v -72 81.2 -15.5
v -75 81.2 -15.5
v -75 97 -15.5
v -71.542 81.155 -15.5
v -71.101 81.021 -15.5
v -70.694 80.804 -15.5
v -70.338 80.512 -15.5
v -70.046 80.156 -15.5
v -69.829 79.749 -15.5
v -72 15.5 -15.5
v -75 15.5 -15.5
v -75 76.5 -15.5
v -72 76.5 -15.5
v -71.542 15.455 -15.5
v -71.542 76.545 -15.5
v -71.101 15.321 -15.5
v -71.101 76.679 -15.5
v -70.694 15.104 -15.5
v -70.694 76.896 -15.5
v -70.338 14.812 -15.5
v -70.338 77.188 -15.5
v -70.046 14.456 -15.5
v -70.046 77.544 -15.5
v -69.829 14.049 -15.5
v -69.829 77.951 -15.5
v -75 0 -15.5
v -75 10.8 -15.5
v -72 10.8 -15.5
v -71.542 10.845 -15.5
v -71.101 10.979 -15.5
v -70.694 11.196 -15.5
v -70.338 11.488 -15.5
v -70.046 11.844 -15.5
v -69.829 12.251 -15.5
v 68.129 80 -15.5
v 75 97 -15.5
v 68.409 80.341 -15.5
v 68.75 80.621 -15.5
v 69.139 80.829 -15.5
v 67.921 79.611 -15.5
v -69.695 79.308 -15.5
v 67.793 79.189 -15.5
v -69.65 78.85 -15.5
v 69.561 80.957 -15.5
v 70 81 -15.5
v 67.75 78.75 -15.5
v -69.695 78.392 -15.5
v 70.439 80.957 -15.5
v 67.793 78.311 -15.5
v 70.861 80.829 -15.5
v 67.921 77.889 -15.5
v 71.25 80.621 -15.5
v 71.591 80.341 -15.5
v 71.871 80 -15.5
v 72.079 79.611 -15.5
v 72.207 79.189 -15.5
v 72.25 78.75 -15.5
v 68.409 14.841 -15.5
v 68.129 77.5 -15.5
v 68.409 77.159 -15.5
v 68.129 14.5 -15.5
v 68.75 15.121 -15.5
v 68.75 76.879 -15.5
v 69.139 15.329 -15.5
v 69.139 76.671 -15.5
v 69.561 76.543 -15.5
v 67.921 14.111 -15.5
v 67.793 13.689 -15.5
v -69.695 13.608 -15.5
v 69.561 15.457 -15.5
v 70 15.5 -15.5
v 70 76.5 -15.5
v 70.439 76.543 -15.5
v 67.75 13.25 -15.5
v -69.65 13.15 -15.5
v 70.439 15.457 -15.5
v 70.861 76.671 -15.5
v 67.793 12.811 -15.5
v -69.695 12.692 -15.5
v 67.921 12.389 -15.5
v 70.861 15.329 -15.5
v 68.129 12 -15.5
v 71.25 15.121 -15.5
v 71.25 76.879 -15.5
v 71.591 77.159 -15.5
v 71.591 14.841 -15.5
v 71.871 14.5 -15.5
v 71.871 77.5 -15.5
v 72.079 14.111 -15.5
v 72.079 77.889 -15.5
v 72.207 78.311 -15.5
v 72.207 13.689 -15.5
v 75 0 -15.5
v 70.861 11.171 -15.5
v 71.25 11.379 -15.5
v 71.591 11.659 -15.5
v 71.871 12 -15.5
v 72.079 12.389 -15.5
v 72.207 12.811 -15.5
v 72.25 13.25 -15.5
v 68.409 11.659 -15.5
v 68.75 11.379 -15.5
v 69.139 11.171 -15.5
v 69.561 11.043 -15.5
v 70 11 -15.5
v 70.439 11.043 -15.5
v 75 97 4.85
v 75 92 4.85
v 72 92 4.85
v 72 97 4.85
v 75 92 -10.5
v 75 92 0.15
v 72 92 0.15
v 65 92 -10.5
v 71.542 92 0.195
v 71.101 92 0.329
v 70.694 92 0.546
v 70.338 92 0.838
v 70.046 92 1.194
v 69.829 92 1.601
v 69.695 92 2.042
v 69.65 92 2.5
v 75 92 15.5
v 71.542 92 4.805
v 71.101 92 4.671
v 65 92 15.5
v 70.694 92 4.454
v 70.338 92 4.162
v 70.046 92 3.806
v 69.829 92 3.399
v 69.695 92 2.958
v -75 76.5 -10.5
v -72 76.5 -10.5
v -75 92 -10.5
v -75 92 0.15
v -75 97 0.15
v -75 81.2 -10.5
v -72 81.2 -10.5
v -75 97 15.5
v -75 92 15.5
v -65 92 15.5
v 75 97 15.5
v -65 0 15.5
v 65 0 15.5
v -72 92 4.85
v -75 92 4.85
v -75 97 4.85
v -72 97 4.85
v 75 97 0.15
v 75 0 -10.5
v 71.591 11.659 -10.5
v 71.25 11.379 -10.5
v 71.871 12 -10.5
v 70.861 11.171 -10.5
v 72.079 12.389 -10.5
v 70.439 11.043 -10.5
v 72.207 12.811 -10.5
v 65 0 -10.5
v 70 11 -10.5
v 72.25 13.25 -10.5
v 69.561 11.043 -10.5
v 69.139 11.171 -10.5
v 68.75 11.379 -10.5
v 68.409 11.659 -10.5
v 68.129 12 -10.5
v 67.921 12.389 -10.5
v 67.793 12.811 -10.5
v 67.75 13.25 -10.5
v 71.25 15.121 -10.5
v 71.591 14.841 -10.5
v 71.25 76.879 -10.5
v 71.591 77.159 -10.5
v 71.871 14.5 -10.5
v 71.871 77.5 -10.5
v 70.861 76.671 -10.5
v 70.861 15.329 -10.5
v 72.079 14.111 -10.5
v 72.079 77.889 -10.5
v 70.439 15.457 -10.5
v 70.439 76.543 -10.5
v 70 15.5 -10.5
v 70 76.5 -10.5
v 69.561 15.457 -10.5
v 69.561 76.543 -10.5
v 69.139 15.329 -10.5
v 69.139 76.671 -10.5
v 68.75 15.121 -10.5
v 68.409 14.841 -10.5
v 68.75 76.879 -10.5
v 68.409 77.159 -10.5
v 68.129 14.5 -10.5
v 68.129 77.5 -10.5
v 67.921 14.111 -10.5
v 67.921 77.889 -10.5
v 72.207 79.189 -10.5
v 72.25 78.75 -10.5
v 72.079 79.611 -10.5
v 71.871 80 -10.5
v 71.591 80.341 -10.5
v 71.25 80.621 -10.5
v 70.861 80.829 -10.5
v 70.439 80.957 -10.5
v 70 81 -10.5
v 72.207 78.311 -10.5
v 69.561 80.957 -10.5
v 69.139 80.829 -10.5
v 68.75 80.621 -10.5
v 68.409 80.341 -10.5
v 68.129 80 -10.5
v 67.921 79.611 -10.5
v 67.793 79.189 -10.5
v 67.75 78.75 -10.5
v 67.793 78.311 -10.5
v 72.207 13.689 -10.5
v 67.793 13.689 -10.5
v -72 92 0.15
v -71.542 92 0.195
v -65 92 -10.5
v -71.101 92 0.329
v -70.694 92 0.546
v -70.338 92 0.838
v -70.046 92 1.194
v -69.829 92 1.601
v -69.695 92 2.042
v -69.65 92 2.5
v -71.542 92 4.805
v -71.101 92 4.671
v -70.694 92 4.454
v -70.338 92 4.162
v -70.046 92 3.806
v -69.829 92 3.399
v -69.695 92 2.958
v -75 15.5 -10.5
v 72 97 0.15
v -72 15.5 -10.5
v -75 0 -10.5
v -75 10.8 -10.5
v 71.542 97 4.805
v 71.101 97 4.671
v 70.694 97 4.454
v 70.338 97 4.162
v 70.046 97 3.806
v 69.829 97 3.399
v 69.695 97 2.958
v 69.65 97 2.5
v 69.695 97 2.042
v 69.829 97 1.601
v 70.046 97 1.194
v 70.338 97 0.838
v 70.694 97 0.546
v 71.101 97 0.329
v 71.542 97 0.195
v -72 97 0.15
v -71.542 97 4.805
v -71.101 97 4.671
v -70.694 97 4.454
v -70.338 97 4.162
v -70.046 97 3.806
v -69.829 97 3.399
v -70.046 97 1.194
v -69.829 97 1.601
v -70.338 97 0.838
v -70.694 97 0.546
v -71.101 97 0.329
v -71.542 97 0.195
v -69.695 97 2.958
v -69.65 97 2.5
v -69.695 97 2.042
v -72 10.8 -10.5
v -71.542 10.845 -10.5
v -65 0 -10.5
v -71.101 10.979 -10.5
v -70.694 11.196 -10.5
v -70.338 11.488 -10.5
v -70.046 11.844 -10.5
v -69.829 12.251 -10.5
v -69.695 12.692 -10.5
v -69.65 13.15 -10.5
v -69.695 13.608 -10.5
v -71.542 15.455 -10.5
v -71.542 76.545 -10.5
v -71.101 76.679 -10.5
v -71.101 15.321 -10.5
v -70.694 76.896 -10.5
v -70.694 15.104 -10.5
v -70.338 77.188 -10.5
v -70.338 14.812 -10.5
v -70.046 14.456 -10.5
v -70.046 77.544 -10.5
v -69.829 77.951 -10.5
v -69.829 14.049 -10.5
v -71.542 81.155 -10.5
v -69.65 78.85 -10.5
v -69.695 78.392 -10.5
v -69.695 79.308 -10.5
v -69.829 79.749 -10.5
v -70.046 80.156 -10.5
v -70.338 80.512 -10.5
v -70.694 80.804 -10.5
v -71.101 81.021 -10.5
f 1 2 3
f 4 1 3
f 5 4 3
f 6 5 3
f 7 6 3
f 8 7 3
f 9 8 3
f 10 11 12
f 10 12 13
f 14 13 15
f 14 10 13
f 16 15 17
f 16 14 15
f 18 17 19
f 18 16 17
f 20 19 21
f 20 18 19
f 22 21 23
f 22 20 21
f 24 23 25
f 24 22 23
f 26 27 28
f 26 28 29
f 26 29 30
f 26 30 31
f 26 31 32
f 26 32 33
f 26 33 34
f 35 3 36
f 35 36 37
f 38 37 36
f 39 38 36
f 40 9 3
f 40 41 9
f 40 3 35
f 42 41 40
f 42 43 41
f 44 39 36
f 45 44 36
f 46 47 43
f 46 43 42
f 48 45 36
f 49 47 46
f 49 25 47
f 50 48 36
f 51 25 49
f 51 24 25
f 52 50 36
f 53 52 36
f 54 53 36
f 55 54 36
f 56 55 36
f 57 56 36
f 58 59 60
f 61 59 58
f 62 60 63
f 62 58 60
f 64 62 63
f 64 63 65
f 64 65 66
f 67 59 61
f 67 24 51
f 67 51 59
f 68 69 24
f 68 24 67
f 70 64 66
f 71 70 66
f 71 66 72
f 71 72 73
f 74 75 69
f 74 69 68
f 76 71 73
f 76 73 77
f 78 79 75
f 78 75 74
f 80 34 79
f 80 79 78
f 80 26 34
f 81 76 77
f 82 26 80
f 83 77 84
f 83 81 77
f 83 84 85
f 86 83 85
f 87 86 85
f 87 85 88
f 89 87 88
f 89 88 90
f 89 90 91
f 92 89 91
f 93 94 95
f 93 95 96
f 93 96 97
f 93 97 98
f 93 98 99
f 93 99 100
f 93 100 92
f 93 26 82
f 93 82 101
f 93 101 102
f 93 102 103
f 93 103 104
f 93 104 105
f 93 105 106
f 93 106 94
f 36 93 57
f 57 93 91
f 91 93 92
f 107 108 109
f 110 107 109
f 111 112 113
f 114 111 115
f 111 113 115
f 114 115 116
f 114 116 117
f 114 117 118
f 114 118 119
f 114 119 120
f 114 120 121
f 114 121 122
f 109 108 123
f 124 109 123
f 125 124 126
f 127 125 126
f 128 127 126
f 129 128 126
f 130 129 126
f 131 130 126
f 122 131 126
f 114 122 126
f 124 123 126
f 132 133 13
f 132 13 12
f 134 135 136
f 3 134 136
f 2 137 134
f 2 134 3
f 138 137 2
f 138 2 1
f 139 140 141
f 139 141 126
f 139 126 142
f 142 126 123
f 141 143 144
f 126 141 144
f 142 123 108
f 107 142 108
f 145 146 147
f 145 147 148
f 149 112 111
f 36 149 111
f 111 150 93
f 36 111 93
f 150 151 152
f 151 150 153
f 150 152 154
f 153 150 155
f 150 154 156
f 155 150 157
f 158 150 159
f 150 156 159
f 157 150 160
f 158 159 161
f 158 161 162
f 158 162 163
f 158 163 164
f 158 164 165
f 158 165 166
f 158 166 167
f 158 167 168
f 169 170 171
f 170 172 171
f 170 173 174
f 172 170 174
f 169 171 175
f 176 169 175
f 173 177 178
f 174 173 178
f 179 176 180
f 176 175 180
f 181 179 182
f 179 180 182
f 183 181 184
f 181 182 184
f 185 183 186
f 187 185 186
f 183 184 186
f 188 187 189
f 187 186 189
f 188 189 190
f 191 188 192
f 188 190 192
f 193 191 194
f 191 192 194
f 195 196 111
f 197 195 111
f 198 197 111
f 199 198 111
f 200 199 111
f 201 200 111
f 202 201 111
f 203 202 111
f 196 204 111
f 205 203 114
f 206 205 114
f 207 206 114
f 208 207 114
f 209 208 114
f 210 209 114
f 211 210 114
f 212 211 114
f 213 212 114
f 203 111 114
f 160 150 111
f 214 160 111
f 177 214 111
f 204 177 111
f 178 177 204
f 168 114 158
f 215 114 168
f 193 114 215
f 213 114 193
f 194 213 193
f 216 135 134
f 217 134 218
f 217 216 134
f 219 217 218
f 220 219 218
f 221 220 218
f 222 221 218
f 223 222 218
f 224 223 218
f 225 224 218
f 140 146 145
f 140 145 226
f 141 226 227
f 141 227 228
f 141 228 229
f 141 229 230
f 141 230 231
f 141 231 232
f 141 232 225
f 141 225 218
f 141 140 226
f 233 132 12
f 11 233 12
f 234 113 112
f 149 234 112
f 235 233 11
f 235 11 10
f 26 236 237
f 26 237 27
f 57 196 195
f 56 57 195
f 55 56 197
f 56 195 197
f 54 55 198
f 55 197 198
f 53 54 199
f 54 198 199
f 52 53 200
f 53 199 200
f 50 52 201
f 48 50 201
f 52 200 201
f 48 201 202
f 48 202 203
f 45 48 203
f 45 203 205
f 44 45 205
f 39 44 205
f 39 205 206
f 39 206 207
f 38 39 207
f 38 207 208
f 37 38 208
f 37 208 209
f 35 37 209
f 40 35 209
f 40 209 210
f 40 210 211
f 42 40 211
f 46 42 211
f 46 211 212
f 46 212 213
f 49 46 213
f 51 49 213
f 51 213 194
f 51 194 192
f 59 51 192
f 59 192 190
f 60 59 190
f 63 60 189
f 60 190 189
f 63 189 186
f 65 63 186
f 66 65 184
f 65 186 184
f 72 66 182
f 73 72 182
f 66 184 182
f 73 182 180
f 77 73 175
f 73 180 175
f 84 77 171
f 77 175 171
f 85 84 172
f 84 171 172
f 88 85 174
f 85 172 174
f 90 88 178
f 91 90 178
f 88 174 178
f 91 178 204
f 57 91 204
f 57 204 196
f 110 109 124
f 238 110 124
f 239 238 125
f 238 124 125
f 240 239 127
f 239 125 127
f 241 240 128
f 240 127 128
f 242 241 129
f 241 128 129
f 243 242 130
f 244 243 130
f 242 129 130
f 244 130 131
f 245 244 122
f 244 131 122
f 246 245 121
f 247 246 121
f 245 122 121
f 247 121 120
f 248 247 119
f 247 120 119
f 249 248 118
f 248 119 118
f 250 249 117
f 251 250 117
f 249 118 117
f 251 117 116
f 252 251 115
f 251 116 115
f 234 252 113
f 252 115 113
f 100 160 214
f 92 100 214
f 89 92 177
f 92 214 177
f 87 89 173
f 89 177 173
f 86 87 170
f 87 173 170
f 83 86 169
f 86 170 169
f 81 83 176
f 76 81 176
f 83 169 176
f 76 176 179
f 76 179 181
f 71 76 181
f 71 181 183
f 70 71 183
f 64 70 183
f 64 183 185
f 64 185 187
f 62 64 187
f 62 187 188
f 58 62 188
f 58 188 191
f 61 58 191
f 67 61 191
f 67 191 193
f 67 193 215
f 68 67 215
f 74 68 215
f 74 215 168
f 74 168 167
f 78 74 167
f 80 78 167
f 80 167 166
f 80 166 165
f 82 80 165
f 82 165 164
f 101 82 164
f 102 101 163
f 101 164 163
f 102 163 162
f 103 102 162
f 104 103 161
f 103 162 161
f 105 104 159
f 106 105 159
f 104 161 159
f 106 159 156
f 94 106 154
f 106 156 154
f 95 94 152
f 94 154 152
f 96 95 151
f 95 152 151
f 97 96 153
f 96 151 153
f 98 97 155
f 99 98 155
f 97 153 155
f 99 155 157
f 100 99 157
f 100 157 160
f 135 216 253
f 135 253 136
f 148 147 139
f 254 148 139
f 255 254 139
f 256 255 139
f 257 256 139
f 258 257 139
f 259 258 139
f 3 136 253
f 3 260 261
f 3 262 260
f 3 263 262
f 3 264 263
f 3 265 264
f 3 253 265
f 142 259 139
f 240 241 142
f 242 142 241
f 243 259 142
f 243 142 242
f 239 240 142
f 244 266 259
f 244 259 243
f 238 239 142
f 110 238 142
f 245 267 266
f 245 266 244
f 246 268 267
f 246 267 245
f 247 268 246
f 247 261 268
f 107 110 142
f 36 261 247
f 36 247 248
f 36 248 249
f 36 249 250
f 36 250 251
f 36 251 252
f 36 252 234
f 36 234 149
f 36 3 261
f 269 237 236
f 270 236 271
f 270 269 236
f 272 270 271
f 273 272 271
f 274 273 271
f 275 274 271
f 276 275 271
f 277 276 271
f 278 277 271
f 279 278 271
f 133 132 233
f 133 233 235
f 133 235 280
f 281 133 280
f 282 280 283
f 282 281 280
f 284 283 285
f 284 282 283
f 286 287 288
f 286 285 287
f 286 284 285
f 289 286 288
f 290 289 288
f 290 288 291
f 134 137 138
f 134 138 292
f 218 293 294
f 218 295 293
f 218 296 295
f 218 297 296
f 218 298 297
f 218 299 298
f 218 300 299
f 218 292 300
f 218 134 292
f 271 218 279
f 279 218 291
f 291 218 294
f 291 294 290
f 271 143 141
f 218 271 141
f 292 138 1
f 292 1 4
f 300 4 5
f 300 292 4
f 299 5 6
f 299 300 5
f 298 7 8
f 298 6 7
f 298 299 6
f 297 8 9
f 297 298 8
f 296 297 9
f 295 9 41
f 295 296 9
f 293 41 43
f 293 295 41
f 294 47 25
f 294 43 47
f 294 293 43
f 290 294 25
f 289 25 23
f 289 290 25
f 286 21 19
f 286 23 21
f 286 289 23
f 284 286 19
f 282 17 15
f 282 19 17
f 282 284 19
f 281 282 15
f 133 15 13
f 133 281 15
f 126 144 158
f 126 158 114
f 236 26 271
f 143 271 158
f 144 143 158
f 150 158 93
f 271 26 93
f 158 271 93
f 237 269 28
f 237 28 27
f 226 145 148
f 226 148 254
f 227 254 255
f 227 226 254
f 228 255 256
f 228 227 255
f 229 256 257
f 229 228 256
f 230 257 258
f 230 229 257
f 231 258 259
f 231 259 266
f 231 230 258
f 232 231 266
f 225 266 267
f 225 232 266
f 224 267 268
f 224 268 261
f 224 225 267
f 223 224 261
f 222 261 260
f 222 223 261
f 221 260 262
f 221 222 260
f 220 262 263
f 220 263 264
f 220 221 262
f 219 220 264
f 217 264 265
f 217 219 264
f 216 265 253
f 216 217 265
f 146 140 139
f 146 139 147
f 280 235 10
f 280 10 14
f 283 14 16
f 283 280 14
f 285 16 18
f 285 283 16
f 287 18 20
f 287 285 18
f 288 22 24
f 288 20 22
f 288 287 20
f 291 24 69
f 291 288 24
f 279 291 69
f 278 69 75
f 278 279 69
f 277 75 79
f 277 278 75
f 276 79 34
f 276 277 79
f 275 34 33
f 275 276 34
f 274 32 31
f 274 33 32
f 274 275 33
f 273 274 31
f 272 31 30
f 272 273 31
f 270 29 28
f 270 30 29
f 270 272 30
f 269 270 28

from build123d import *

# Parameters (mm, degrees)
SKETCH_1_W          = 150
SKETCH_1_H          = 31
EXTRUDE_1_DEPTH     = 97
SKETCH_2_R          = 2.25
CUT_EXTRUDE_1_DEPTH = 127.471340627
SKETCH_3_W          = 10
SKETCH_3_H          = 92
CUT_EXTRUDE_2_DEPTH = 26
CUT_EXTRUDE_3_DEPTH = 5


with BuildPart() as part:
    # 草图1 → 凸台-拉伸1 (new body)
    with BuildSketch(Plane(origin=(0, 0, 0), x_dir=(1, 0, 0), z_dir=(0, 1, 0))):
        Rectangle(SKETCH_1_W, SKETCH_1_H)
    extrude(amount=EXTRUDE_1_DEPTH)

    # 草图2 → 切除-拉伸1 (cut, through all)
    with BuildSketch(Plane.XY.offset(15.5)):
        with Locations((70, 13.25)):
            Circle(SKETCH_2_R)
        with Locations((70, 78.75)):
            Circle(SKETCH_2_R)
        with BuildLine():
            Line((-75, 15.5), (-72, 15.5))
            ThreePointArc((-72, 15.5), (-69.65, 13.15), (-72, 10.8))
            Line((-72, 10.8), (-75, 10.8))
            ThreePointArc((-75, 10.8), (-77.35, 13.15), (-75, 15.5))
        make_face()
        with BuildLine():
            Line((-75, 81.2), (-72, 81.2))
            ThreePointArc((-72, 81.2), (-69.65, 78.85), (-72, 76.5))
            Line((-72, 76.5), (-75, 76.5))
            ThreePointArc((-75, 76.5), (-77.35, 78.85), (-75, 81.2))
        make_face()
    extrude(amount=-CUT_EXTRUDE_1_DEPTH, mode=Mode.SUBTRACT)

    # 草图3 → 切除-拉伸2 (cut)
    with BuildSketch(Plane.XY.offset(15.5)):
        with Locations((-70, 46)):
            Rectangle(SKETCH_3_W, SKETCH_3_H)
    cut_extrude_2 = extrude(amount=-CUT_EXTRUDE_2_DEPTH, mode=Mode.SUBTRACT)

    # 镜向1: 切除-拉伸2 across plane
    add(cut_extrude_2.mirror(Plane(origin=(0, 0, 0), x_dir=(0, 0, 1), z_dir=(1, 0, 0))), mode=Mode.SUBTRACT)

    # 草图4 → 切除-拉伸3 (cut)
    with BuildSketch(Plane.XZ.offset(-92)):
        with BuildLine():
            Line((-75, 4.85), (-72, 4.85))
            ThreePointArc((-72, 4.85), (-69.65, 2.5), (-72, 0.15))
            Line((-72, 0.15), (-75, 0.15))
            ThreePointArc((-75, 0.15), (-77.35, 2.5), (-75, 4.85))
        make_face()
    cut_extrude_3 = extrude(amount=-CUT_EXTRUDE_3_DEPTH, mode=Mode.SUBTRACT)

    # 镜向2: 切除-拉伸3 across plane
    add(cut_extrude_3.mirror(Plane(origin=(0, 0, 0), x_dir=(0, 0, 1), z_dir=(1, 0, 0))), mode=Mode.SUBTRACT)


solid = part.part
